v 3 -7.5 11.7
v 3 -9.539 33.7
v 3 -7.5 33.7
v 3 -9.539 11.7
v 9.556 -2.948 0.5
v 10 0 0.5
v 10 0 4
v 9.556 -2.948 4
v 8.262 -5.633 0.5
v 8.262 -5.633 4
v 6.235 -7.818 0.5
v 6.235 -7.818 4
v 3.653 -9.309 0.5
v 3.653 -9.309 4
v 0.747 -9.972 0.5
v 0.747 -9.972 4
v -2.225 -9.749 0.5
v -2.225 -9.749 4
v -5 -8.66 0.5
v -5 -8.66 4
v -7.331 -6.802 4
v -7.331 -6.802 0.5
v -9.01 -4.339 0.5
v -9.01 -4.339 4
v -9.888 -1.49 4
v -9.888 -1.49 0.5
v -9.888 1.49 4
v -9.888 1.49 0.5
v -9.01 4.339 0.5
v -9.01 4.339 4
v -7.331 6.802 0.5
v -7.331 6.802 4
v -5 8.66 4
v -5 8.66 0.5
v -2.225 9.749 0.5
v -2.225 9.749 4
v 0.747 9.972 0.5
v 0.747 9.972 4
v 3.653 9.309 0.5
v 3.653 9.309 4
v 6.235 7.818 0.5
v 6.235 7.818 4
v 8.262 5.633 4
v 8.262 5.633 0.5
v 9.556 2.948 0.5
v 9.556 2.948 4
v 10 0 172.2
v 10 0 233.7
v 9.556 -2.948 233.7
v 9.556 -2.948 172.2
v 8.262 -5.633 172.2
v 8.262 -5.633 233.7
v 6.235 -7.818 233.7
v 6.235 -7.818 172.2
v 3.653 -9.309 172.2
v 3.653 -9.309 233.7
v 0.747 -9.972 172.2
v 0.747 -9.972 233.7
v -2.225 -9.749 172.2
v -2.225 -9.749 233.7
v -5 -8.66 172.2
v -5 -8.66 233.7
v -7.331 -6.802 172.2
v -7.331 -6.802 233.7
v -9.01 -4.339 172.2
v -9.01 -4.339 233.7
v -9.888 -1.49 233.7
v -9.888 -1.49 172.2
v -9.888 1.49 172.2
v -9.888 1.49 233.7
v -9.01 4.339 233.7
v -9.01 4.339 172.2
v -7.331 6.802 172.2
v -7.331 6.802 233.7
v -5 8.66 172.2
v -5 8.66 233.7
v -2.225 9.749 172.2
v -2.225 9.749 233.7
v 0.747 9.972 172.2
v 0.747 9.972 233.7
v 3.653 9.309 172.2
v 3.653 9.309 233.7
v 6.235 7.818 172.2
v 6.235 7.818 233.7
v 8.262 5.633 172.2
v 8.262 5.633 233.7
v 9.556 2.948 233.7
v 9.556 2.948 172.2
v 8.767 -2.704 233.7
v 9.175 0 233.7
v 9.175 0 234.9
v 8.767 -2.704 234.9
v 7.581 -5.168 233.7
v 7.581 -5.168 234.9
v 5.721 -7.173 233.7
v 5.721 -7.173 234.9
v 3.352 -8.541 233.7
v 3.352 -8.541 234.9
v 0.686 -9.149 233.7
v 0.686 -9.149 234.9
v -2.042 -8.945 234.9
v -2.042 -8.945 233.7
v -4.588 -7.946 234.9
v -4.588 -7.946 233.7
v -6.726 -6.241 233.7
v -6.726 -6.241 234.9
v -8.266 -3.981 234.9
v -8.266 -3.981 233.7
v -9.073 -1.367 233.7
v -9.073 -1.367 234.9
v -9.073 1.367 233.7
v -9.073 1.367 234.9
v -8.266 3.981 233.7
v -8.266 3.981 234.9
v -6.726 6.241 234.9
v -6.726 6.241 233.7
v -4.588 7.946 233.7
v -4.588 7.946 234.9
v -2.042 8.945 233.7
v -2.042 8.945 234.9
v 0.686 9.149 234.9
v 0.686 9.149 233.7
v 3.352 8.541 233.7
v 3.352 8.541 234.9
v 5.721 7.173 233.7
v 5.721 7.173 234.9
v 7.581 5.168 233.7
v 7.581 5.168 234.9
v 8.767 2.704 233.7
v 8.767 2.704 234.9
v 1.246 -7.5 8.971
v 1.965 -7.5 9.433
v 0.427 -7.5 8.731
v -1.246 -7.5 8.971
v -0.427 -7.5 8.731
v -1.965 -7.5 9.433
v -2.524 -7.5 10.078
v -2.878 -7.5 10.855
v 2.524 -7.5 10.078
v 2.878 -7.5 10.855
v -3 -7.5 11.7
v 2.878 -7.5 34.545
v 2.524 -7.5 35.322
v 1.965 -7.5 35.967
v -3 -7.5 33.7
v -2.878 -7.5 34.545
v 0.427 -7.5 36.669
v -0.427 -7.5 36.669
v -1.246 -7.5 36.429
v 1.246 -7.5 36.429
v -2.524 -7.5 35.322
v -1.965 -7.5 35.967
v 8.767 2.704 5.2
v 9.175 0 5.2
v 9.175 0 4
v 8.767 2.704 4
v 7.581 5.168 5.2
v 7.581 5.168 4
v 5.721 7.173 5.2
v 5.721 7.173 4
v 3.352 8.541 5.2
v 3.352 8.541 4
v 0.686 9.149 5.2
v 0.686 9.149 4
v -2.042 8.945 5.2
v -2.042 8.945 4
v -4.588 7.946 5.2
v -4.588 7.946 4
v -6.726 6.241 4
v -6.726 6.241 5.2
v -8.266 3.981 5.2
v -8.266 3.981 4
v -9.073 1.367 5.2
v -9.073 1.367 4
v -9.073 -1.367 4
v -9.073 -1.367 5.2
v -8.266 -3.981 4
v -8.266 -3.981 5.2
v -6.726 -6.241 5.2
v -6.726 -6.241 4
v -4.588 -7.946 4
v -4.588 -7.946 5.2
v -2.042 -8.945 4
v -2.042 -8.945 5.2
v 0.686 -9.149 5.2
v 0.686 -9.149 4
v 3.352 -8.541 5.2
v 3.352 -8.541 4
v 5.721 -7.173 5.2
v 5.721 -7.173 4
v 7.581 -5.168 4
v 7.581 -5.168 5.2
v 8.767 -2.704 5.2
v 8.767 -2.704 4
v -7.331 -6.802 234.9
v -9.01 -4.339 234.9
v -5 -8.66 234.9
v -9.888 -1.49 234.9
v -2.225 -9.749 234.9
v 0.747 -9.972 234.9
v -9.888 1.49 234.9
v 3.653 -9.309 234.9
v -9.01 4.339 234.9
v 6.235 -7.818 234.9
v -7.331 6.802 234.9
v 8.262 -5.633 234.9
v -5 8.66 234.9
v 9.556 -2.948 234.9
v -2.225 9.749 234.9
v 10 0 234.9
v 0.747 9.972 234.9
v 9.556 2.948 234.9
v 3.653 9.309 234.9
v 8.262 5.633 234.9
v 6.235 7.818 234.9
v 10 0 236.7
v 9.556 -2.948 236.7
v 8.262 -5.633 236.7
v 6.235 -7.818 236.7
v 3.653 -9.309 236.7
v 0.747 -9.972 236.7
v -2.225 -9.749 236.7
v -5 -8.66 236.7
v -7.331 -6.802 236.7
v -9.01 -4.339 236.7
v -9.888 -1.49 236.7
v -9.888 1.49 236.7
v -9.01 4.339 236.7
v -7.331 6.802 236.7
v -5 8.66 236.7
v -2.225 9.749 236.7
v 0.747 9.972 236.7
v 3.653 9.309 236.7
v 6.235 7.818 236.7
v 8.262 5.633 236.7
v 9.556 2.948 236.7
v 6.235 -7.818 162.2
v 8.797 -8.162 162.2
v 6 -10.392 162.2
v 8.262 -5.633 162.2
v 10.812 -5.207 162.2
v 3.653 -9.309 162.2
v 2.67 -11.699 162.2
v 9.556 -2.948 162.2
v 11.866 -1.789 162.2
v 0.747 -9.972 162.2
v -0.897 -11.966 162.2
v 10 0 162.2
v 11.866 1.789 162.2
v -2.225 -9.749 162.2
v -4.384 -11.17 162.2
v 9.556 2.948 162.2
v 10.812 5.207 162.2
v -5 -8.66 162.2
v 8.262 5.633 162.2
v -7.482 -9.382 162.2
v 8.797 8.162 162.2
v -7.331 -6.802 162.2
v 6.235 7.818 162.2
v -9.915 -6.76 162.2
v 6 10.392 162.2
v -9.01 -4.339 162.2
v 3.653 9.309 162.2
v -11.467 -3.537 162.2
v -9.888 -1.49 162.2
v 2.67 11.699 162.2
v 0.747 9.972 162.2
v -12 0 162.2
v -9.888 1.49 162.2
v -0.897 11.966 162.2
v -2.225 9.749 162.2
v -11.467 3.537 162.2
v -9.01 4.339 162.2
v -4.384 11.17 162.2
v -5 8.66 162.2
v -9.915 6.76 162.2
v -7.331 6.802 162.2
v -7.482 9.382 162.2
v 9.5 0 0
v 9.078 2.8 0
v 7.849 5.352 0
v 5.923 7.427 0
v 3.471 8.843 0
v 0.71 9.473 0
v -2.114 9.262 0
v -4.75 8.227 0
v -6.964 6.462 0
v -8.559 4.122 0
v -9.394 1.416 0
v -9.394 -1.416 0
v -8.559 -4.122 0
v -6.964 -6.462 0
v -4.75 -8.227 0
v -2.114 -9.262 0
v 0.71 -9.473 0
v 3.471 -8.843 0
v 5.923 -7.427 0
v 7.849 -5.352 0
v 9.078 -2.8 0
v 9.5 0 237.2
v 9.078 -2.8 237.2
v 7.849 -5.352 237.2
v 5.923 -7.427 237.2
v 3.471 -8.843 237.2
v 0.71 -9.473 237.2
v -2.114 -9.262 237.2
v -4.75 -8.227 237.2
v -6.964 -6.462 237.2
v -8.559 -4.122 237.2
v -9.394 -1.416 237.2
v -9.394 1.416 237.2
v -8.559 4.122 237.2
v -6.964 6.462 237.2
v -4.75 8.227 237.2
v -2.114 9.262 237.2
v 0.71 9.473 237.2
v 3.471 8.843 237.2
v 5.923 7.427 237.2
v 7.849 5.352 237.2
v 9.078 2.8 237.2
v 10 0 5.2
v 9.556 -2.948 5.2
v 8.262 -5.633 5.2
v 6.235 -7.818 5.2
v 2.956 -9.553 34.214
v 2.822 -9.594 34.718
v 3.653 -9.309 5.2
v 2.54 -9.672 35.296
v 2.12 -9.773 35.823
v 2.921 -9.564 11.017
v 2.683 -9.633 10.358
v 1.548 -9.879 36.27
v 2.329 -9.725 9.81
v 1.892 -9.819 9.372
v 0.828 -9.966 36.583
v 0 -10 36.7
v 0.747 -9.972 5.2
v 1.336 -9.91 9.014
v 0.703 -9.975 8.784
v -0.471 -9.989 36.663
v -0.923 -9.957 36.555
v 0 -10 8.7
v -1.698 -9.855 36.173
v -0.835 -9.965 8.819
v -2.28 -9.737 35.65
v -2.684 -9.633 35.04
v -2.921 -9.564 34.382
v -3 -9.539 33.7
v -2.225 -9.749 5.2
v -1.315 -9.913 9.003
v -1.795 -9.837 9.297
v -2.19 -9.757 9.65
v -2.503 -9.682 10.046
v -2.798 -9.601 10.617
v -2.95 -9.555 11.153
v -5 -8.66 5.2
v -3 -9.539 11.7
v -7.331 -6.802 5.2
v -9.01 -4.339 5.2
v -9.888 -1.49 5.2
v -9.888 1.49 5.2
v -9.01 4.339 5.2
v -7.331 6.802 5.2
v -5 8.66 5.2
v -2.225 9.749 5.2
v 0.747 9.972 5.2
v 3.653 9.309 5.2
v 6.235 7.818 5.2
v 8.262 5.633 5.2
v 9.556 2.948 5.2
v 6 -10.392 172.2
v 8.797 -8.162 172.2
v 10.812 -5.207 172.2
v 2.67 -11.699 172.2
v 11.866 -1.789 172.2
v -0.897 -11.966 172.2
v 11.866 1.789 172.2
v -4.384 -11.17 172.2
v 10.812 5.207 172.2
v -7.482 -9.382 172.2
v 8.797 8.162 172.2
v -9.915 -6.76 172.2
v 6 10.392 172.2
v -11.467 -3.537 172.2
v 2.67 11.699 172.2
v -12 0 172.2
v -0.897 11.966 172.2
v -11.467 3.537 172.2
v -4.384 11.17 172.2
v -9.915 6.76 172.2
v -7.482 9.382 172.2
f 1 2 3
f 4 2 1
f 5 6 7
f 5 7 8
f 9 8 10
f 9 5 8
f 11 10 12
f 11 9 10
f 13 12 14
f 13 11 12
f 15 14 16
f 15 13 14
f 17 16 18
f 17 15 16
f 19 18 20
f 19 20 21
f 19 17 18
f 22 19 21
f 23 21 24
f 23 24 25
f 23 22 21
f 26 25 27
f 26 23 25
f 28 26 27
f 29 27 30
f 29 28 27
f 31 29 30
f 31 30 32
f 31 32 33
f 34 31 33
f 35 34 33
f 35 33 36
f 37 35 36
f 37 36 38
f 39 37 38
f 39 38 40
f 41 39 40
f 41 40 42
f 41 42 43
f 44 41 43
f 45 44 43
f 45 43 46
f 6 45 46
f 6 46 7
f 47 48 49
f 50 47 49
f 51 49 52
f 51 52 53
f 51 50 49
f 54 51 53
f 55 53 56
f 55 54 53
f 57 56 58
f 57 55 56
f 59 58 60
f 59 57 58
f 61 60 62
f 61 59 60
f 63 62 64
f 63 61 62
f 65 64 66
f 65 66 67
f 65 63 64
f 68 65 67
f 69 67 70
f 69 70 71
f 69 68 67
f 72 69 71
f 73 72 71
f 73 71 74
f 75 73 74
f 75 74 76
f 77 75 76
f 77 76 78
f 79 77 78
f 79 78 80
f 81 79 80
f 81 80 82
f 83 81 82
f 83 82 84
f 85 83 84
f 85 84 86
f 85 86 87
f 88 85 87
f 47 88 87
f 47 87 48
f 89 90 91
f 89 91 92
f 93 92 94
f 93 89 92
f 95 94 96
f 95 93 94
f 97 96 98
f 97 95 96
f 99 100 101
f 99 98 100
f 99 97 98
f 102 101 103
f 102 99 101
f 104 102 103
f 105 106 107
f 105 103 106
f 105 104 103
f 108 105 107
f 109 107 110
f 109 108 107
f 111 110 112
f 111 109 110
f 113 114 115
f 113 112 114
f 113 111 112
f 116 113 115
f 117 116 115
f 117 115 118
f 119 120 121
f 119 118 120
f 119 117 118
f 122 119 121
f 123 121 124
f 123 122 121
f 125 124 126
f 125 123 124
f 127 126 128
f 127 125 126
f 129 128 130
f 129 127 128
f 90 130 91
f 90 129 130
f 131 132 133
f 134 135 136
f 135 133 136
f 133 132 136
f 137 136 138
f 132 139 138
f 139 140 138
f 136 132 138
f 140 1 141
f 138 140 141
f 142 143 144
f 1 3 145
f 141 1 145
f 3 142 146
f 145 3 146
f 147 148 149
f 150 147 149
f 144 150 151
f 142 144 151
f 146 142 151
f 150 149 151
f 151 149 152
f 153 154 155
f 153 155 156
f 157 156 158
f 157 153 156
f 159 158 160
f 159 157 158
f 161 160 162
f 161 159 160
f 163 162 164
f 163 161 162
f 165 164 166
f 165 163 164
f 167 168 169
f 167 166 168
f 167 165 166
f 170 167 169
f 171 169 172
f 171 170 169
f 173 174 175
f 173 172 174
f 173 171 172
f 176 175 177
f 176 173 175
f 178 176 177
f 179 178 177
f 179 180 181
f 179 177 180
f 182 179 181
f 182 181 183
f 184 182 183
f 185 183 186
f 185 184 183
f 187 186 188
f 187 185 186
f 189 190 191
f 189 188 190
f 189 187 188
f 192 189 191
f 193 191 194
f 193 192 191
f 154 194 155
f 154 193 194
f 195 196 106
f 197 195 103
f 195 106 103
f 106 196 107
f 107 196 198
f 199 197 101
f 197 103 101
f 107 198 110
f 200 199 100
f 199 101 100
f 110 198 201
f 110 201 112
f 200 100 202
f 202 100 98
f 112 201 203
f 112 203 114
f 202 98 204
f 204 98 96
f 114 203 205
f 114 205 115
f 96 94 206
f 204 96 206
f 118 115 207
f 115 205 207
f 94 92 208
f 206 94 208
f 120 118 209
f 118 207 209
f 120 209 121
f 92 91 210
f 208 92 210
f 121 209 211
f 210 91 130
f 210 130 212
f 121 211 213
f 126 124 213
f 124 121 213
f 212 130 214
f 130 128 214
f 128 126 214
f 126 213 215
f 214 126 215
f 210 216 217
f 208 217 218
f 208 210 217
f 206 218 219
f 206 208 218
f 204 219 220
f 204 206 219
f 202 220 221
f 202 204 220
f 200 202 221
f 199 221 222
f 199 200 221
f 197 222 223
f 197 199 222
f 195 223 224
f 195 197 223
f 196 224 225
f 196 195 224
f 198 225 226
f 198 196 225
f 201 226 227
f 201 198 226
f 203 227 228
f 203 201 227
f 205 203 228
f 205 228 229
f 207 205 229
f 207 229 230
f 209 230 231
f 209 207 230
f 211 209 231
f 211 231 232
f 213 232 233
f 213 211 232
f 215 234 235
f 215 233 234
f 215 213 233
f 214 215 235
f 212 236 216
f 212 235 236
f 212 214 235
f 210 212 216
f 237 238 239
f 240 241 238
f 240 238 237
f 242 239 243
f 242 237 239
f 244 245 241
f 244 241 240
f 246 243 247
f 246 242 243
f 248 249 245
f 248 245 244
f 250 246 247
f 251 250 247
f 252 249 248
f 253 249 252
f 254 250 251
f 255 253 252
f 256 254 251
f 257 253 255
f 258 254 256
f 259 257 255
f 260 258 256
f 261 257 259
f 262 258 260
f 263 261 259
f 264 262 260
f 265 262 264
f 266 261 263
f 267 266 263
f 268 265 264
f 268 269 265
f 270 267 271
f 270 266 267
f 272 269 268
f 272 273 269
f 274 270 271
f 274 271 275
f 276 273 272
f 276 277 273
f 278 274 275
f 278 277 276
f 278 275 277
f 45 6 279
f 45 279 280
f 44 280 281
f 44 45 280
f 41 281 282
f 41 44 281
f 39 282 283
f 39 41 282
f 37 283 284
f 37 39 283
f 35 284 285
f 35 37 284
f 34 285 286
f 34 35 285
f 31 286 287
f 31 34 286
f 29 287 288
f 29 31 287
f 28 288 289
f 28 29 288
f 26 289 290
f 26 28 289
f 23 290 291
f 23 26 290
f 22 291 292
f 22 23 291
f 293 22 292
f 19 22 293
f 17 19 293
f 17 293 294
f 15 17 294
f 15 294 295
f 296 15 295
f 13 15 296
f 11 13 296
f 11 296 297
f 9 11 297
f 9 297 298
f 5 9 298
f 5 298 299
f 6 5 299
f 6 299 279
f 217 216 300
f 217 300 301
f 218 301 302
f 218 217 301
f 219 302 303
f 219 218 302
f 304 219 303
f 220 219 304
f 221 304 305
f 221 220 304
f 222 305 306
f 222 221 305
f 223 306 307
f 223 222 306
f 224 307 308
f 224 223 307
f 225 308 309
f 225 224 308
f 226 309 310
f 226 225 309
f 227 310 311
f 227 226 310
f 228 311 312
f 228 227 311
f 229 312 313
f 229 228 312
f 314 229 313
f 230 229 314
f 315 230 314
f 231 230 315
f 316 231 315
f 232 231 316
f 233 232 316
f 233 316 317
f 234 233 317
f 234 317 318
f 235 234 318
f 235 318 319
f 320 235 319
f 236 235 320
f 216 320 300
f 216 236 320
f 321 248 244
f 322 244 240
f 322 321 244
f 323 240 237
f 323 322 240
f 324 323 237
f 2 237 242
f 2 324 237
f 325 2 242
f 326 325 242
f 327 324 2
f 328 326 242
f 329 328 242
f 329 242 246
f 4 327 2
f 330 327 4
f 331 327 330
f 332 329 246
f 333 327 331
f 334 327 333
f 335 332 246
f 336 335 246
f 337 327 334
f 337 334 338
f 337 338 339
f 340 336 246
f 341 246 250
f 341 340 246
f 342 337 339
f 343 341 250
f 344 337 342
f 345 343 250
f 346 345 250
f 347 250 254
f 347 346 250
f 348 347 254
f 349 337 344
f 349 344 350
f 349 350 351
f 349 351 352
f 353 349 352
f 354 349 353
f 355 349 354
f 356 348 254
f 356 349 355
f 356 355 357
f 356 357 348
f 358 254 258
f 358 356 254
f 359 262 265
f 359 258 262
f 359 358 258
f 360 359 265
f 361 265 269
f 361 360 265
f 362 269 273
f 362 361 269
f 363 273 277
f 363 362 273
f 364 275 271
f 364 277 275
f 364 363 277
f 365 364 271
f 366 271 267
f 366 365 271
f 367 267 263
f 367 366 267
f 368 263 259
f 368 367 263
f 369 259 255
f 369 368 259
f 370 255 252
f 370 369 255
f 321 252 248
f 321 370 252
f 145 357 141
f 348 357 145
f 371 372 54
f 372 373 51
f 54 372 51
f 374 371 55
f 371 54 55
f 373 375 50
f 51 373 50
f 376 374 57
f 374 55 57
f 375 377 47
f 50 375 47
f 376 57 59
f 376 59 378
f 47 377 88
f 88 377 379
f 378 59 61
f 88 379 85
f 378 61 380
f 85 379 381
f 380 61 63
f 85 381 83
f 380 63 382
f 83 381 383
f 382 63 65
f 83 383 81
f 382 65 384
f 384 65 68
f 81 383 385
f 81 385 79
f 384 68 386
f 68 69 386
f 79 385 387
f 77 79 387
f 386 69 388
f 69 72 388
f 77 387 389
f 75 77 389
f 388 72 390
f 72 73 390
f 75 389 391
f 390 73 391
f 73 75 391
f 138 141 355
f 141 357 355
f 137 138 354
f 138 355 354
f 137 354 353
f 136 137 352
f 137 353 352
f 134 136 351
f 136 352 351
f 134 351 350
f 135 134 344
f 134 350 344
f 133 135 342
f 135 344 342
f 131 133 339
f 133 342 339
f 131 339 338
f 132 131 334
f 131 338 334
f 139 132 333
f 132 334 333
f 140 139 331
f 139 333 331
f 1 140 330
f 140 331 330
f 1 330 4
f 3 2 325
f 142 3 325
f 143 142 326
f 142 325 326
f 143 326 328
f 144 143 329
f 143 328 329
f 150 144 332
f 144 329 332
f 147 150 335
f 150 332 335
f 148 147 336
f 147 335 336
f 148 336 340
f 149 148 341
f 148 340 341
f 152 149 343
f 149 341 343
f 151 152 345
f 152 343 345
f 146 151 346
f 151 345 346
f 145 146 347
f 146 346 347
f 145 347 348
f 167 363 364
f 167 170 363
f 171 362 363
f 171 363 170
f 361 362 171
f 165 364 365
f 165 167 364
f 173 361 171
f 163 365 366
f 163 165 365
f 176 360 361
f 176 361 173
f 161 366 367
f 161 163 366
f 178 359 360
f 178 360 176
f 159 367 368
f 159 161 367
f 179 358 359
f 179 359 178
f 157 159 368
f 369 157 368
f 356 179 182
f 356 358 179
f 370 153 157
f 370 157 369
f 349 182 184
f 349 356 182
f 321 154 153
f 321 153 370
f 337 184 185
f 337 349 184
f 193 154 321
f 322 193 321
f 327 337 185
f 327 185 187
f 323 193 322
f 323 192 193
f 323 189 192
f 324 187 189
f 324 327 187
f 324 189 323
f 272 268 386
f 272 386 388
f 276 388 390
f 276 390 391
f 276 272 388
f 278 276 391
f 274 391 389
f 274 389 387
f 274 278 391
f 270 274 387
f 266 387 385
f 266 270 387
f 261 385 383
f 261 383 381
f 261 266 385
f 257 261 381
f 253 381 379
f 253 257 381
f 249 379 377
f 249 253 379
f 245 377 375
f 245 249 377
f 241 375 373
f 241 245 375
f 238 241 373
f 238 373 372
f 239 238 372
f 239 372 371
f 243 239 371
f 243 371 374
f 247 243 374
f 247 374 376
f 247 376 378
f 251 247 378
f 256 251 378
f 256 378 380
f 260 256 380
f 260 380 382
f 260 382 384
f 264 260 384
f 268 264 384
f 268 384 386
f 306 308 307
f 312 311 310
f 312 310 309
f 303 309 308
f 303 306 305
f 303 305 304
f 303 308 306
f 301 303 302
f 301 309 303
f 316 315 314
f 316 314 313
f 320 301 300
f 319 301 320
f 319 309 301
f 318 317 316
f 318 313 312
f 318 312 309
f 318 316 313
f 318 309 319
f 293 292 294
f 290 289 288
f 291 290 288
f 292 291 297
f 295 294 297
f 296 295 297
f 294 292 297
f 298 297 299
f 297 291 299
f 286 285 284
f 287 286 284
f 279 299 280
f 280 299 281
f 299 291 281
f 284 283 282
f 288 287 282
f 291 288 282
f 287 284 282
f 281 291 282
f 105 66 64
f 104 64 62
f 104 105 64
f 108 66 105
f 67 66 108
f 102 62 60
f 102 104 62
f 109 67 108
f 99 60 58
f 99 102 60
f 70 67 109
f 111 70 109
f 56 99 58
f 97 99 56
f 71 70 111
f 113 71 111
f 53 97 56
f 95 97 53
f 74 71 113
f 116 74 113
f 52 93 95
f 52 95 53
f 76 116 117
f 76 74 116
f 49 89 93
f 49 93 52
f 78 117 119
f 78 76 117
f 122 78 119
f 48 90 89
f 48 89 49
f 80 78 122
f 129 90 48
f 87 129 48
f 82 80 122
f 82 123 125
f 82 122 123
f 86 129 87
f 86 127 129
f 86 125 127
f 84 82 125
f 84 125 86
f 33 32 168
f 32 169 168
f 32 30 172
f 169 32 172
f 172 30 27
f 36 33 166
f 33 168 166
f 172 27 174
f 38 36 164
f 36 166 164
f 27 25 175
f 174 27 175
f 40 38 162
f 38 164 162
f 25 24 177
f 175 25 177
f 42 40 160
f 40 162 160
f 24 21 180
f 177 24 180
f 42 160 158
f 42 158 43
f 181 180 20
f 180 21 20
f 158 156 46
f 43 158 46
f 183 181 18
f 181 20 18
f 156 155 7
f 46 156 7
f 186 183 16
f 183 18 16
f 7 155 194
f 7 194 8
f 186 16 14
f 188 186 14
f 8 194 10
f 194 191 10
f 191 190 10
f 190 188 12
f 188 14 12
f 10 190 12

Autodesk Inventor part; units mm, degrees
ref_plane "YZ Plane" through (0, 0, 0) normal (1, 0, 0) x (0, 1, 0)
sketch "草图1" plane through (0, 0, 0) normal (0, 0, 1) x (1, 0, 0)
  circle A0 centre (0, 0) radius 10
  dimension "d0" = 20
extrude "拉伸1" add sketch "草图1" along normal blind 237.2
ref_plane "工作平面1" through (0, -10, 0) normal (0, 1, 0) x (-1, 0, 0)
sketch "草图2" plane through (0, -10, 0) normal (0, 1, 0) x (-1, 0, 0)
  line L0 (3, 33.7) -> (-3, 33.7)
  line L1 (-3, 33.7) -> (-3, 11.7)
  line L2 (-3, 11.7) -> (3, 11.7)
  line L3 (3, 11.7) -> (3, 33.7)
  arc A0 (3, 33.7) -> (-3, 33.7) centre (0, 33.7) ccw
  arc A1 (-3, 11.7) -> (3, 11.7) centre (0, 11.7) ccw
  line L4 (0, 0) -> (0, 11.7)
  dimension "d3" = 6
  dimension "d4" = 22
  dimension "d5" = 11.7
extrude "拉伸2" cut sketch "草图2" along normal blind 2.5
sketch "草图3" plane through (0, 0, 0) normal (0, 1, 0) x (-1, 0, 0)
  line L0 (-9.175, 5.2) -> (-16.1829, 5.2)
  line L1 (-16.1829, 5.2) -> (-16.1829, 4)
  line L2 (-16.1829, 4) -> (-9.175, 4)
  line L3 (-9.175, 4) -> (-9.175, 5.2)
  line L4 (0, 0) -> (0, -12.502)
  line L5 (-10, 0) -> (10, 0) projected
  dimension "d8" = 12.502
  dimension "d9" = 4
  dimension "d10" = 1.2
  dimension "d11" = 9.175
  dimension "d12" = 7.0079
revolve "旋转1" cut sketch "草图3" angle 360 about axis through (0, 0, 0) along (0, 0, -1)
chamfer "倒角1" distance 0.5 angle 45 1 edges at (-10, 0, 0)
ref_plane "工作平面2" through (0, 0, 162.2) normal (0, 0, -1) x (-1, 0, 0)
sketch "草图4" plane through (0, 0, 162.2) normal (0, 0, -1) x (-1, 0, 0)
  circle A0 centre (0, 0) radius 12
  circle A1 centre (0, 0) radius 10 projected
  dimension "d18" = 24
extrude "拉伸3" add sketch "草图4" against normal blind 10
chamfer "倒角2" distance 0.5 angle 45 1 edges at (-10, 0, 237.2)
sketch "草图5" plane through (0, 0, 0) normal (0, 1, 0) x (-1, 0, 0)
  line L0 (-12, 234.9) -> (-9.175, 234.9)
  line L1 (-9.175, 234.9) -> (-9.175, 233.7)
  line L2 (-9.175, 233.7) -> (-12, 233.7)
  line L3 (-12, 233.7) -> (-12, 234.9)
  line L4 (-9.5, 237.2) -> (9.5, 237.2) projected
  line L5 (10, 236.7) -> (-10, 236.7) projected
  line L6 (0, 236.7) -> (0, 240.4719)
  point P0 (0, 0)
  dimension "d24" = 1.2
  dimension "d25" = 2.3
  dimension "d26" = 3.7719
  dimension "d27" = 12
  dimension "d29" = 9.175
revolve "旋转2" cut sketch "草图5" angle 360 about axis through (0, 0, 236.7) along (0, 0, 1)
properties part number "齿轮60-2万向轴"
